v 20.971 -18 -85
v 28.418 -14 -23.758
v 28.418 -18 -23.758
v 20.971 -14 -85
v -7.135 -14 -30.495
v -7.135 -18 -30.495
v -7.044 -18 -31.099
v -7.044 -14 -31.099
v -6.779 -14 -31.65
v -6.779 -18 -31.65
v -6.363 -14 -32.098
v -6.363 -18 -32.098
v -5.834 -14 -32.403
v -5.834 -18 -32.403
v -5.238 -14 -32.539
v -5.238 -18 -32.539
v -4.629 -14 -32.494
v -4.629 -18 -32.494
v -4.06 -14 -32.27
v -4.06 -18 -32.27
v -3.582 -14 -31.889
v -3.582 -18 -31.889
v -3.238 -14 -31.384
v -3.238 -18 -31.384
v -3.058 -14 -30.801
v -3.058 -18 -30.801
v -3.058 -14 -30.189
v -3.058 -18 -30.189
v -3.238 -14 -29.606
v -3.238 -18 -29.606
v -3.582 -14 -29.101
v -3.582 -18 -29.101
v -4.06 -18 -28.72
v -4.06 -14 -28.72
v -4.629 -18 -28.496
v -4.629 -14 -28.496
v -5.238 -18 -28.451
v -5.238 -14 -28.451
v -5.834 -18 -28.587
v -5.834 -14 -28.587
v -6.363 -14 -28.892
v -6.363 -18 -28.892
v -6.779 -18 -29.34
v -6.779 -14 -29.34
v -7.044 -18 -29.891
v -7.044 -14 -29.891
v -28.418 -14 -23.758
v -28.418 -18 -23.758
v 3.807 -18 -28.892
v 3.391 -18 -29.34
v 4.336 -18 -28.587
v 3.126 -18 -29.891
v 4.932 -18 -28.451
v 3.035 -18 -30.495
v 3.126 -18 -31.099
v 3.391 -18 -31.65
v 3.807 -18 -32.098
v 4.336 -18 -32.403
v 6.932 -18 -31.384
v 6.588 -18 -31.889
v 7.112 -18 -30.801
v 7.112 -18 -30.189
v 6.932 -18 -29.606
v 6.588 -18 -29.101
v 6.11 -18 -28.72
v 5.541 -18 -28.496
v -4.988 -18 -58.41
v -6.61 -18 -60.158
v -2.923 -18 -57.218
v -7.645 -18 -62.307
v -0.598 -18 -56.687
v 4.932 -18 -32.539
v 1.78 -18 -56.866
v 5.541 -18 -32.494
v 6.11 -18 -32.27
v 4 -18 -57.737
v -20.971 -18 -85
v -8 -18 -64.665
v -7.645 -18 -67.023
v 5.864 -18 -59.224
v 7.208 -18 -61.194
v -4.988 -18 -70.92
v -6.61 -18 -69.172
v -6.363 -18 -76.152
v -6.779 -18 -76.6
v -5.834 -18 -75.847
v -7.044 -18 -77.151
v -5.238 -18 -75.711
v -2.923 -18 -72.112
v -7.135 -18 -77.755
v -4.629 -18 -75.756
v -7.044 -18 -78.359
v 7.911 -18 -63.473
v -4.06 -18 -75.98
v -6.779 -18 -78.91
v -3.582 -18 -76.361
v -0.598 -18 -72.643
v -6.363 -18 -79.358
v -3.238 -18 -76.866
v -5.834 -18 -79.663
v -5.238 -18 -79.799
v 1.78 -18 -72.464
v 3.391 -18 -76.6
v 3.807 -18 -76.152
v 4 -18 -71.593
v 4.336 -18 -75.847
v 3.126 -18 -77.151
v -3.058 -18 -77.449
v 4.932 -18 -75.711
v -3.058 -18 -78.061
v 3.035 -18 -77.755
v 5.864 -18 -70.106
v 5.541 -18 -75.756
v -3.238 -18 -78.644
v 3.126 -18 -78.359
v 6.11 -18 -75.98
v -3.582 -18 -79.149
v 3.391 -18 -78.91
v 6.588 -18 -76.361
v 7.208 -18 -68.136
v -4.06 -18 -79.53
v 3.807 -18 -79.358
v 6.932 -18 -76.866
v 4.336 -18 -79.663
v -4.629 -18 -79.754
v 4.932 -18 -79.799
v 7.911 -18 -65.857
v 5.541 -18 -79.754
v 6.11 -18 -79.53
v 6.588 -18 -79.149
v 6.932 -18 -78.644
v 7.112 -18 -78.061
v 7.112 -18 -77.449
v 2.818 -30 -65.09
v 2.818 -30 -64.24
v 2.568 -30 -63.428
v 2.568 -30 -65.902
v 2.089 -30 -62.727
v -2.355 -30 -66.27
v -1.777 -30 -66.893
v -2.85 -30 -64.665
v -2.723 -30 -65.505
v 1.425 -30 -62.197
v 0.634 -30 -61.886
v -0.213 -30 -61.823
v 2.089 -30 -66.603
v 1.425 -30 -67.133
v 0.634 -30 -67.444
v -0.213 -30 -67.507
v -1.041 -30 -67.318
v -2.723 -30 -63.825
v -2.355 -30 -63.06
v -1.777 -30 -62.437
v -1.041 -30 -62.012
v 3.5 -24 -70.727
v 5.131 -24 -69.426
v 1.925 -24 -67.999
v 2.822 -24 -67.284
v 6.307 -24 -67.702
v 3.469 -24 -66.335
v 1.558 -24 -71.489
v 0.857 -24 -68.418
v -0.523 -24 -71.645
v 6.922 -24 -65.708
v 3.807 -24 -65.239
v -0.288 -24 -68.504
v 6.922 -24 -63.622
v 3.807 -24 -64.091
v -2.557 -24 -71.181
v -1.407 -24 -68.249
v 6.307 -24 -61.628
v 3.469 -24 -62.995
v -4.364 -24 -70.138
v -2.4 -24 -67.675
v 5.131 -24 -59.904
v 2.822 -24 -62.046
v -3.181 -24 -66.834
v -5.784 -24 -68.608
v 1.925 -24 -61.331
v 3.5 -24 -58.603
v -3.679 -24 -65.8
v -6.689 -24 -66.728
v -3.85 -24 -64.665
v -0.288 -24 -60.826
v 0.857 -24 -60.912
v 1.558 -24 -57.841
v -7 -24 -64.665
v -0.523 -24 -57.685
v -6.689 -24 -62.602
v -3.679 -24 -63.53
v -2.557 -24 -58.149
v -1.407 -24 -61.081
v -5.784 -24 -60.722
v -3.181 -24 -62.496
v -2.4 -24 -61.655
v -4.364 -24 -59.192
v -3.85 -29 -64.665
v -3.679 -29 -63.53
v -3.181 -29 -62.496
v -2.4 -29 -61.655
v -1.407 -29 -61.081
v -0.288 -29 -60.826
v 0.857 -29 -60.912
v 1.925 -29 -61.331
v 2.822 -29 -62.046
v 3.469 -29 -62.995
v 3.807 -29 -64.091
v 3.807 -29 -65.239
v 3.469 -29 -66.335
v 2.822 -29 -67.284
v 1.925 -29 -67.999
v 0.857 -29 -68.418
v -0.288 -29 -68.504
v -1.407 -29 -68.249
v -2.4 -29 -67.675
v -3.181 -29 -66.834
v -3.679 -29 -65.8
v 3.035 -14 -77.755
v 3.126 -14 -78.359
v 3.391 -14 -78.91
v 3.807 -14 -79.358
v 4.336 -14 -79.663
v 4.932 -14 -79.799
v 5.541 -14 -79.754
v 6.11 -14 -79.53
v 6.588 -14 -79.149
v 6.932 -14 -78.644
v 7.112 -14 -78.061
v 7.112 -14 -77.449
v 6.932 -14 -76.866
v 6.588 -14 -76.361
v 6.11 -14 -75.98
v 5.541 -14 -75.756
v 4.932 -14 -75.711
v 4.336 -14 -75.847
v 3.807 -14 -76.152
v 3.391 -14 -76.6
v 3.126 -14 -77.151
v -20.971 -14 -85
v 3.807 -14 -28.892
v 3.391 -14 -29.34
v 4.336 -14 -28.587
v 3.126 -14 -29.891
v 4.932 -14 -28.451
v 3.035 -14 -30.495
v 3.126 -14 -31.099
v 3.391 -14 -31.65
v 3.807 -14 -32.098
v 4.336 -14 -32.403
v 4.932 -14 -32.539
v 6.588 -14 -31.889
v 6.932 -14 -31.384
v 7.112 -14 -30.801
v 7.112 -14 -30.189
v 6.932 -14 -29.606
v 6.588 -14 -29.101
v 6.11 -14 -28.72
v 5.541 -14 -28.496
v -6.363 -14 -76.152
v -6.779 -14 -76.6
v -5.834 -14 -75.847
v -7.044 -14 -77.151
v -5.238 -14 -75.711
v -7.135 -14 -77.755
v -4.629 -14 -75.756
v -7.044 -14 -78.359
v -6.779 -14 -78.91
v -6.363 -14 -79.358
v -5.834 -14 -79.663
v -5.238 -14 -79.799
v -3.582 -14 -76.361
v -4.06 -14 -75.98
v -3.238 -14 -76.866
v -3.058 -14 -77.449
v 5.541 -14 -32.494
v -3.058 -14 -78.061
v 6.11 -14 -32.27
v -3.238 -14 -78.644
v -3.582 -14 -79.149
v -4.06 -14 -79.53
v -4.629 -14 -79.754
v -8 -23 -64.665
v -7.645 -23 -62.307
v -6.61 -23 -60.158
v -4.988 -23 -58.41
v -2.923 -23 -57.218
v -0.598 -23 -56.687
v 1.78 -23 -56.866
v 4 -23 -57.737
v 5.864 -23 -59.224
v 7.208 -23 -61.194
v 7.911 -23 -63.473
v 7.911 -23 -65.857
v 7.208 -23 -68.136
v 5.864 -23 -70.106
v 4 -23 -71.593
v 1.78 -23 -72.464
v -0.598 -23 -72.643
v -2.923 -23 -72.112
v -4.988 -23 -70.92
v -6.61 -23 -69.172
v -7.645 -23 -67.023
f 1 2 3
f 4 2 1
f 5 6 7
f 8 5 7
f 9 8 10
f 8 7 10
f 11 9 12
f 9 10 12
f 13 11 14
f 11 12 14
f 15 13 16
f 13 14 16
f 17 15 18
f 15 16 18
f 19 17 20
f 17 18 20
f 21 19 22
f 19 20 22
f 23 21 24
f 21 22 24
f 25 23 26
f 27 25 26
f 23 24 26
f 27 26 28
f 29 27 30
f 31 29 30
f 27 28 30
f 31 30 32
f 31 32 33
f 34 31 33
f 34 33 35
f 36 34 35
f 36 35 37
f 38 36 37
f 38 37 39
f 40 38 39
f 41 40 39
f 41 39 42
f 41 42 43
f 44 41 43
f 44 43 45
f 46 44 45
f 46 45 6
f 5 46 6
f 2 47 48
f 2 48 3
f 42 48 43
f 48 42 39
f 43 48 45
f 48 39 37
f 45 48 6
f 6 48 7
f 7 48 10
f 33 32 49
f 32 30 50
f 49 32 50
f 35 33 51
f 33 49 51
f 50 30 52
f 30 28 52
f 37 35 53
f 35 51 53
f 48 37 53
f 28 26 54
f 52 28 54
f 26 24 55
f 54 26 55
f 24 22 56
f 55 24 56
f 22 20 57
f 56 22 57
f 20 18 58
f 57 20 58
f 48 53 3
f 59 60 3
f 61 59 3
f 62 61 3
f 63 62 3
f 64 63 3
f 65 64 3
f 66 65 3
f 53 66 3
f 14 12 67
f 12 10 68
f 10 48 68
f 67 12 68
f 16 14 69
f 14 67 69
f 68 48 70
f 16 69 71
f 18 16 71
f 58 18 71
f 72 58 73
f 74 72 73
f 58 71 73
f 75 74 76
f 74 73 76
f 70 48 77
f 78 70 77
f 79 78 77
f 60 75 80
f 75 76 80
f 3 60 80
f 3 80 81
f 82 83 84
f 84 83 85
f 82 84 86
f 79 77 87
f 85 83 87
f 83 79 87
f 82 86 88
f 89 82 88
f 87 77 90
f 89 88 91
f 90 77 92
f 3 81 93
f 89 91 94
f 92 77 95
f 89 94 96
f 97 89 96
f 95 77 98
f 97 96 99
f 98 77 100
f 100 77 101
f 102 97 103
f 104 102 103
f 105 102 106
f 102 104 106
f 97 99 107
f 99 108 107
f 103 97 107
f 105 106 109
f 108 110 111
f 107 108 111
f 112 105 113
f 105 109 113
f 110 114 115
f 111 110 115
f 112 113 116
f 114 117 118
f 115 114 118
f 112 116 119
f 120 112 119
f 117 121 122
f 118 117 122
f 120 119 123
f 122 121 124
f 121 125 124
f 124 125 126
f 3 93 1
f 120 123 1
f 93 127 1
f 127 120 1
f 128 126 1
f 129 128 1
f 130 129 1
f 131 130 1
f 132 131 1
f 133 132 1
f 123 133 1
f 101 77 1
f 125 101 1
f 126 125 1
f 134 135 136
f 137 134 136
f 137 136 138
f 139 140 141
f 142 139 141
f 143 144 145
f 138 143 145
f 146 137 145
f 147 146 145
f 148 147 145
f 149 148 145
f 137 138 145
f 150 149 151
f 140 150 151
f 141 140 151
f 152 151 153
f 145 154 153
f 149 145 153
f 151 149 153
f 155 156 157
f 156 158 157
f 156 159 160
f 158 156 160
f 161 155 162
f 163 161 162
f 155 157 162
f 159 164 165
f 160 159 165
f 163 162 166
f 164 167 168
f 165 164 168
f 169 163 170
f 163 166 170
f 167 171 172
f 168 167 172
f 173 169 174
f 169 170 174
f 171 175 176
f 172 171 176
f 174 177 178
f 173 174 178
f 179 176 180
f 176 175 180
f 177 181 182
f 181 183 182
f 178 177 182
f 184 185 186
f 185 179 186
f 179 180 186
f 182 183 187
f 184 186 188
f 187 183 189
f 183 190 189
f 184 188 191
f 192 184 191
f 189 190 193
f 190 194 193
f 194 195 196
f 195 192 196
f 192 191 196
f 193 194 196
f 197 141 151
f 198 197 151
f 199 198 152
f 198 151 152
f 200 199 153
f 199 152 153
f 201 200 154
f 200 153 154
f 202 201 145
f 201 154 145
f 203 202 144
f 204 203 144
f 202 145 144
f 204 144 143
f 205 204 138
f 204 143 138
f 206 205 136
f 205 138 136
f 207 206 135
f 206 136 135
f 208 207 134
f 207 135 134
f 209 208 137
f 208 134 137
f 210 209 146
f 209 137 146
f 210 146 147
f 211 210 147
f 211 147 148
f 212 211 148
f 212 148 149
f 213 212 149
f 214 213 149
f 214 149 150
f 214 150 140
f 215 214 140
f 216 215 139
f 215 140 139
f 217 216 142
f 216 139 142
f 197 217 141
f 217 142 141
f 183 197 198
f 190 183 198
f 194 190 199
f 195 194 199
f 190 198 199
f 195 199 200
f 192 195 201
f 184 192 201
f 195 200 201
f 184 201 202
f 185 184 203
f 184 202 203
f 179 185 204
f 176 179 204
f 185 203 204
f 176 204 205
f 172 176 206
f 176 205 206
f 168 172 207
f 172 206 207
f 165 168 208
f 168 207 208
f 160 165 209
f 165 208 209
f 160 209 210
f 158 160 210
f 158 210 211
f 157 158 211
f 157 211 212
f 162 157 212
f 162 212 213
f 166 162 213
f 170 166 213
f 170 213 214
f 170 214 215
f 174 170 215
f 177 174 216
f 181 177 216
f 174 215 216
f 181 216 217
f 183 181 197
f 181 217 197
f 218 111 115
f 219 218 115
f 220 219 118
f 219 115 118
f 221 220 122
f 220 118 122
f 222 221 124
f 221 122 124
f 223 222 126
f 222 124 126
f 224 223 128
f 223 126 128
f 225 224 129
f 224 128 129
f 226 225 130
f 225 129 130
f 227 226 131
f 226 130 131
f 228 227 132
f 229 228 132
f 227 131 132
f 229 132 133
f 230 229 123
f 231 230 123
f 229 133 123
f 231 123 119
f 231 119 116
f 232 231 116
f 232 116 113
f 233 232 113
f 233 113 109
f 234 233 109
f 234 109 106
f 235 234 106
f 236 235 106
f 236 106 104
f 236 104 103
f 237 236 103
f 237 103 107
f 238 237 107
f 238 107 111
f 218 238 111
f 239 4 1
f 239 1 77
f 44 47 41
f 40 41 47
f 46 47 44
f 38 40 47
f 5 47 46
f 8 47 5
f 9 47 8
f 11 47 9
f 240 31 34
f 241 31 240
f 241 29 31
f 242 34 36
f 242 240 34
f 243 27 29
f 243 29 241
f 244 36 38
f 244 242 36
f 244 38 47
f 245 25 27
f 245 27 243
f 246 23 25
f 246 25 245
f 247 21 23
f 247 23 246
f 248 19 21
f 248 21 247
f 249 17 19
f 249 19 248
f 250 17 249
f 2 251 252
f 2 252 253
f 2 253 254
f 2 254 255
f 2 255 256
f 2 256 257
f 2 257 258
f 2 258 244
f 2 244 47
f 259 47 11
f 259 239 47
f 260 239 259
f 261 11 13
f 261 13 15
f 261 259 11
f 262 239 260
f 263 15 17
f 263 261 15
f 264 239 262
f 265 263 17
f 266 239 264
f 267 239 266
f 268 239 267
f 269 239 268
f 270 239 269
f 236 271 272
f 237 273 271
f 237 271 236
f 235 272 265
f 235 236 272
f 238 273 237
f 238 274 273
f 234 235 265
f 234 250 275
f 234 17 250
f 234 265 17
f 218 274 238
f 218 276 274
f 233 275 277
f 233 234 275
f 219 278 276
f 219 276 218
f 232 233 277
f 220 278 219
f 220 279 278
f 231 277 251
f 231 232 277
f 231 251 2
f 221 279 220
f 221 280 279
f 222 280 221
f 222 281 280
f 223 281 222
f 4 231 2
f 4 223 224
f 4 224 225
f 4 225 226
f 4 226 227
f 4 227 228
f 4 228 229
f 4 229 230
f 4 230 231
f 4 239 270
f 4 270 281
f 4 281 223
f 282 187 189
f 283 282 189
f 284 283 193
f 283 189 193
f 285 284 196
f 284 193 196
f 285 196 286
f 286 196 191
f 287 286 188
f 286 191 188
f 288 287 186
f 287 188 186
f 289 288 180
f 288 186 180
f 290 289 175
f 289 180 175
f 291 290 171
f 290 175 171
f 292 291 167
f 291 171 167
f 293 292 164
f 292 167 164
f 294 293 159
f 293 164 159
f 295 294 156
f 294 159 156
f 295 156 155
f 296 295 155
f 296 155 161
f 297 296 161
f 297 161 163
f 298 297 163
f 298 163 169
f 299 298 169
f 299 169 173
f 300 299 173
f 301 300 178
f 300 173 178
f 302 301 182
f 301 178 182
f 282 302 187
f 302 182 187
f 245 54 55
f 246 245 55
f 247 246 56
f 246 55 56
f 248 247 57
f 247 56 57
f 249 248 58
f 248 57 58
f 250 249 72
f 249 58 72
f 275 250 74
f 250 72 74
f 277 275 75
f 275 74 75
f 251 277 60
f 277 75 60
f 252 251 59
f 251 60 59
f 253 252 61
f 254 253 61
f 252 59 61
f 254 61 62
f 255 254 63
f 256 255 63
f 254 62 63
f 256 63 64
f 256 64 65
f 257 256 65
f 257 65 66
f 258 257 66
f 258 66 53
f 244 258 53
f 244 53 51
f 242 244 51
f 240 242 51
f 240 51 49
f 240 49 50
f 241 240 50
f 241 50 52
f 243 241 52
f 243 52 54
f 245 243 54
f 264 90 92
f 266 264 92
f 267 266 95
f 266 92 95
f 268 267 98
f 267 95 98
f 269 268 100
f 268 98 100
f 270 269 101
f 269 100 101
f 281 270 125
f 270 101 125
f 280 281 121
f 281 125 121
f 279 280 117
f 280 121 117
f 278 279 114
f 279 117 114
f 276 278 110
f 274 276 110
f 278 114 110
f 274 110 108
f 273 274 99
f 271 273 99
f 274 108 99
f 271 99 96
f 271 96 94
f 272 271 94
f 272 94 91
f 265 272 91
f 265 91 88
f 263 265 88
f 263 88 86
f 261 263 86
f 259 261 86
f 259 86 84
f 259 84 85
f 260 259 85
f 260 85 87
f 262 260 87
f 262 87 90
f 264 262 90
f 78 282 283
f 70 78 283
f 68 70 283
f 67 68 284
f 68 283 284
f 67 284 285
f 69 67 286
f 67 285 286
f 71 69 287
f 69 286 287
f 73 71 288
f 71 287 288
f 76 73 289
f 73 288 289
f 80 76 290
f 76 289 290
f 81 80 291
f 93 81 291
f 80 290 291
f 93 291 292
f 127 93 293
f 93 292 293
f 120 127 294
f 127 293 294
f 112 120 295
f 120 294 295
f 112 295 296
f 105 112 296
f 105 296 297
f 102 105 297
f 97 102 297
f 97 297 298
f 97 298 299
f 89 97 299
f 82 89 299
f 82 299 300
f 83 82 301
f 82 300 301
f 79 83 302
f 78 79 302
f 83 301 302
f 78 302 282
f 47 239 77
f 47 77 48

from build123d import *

# Parameters (mm, degrees)
BOSS_EXTRUDE1_DEPTH            = 4
F_4_1_4_1_DIAMETER_HOLE1_D     = 4.1
F_4_1_4_1_DIAMETER_HOLE1_DEPTH = 16
CHAMFER1_SIZE                  = 1


with BuildPart() as part:
    # Sketch1 → Boss-Extrude1 (new body)
    with BuildSketch(Plane(origin=(0, -13.999999791, 0), x_dir=(1, 0, 0), z_dir=(0, 1, 0))):
        Polygon((-28.418499998, 23.757663266), (28.418499998, 23.757663266), (20.970528274, 85.000000013), (-20.970528274, 85.000000013), align=None)
    extrude(amount=-BOSS_EXTRUDE1_DEPTH)

    # Sketch2 → Revolve1 (revolve)
    with BuildSketch(Plane(origin=(0, 0, -64.665000013), x_dir=(-1, 0, 0), z_dir=(0, 0, -1)), mode=Mode.PRIVATE) as revolve1_sk:
        Polygon((-3.85, -29.999999791), (0, -29.999999791), (0, -17.999999791), (-8, -17.999999791), (-8, -23.999999791), (-3.85, -23.999999791), align=None)
    revolve(revolve1_sk.sketch.rotate(Axis((0, -29.999999791, -64.665000013), (0, 1, 0)), 180), axis=Axis((0, -29.999999791, -64.665000013), (0, 1, 0)))

    # Ø4.1 (4.1) Diameter Hole1
    with Locations(Plane(origin=(0, -13.999999791, 0), x_dir=(1, 0, 0), z_dir=(0, 1, 0))):
        with Locations((-5.085, 30.495), (5.085, 30.495), (5.085, 77.755), (-5.085, 77.755)):
            Hole(F_4_1_4_1_DIAMETER_HOLE1_D / 2, depth=F_4_1_4_1_DIAMETER_HOLE1_DEPTH)

    # Chamfer1
    chamfer1_edges = [part.edges().sort_by_distance(p)[0] for p in [
        (3.85, -29.999999791, -64.665000013),
        (8, -23.999999791, -64.665000013),
    ]]
    chamfer(chamfer1_edges, length=CHAMFER1_SIZE)


solid = part.part
